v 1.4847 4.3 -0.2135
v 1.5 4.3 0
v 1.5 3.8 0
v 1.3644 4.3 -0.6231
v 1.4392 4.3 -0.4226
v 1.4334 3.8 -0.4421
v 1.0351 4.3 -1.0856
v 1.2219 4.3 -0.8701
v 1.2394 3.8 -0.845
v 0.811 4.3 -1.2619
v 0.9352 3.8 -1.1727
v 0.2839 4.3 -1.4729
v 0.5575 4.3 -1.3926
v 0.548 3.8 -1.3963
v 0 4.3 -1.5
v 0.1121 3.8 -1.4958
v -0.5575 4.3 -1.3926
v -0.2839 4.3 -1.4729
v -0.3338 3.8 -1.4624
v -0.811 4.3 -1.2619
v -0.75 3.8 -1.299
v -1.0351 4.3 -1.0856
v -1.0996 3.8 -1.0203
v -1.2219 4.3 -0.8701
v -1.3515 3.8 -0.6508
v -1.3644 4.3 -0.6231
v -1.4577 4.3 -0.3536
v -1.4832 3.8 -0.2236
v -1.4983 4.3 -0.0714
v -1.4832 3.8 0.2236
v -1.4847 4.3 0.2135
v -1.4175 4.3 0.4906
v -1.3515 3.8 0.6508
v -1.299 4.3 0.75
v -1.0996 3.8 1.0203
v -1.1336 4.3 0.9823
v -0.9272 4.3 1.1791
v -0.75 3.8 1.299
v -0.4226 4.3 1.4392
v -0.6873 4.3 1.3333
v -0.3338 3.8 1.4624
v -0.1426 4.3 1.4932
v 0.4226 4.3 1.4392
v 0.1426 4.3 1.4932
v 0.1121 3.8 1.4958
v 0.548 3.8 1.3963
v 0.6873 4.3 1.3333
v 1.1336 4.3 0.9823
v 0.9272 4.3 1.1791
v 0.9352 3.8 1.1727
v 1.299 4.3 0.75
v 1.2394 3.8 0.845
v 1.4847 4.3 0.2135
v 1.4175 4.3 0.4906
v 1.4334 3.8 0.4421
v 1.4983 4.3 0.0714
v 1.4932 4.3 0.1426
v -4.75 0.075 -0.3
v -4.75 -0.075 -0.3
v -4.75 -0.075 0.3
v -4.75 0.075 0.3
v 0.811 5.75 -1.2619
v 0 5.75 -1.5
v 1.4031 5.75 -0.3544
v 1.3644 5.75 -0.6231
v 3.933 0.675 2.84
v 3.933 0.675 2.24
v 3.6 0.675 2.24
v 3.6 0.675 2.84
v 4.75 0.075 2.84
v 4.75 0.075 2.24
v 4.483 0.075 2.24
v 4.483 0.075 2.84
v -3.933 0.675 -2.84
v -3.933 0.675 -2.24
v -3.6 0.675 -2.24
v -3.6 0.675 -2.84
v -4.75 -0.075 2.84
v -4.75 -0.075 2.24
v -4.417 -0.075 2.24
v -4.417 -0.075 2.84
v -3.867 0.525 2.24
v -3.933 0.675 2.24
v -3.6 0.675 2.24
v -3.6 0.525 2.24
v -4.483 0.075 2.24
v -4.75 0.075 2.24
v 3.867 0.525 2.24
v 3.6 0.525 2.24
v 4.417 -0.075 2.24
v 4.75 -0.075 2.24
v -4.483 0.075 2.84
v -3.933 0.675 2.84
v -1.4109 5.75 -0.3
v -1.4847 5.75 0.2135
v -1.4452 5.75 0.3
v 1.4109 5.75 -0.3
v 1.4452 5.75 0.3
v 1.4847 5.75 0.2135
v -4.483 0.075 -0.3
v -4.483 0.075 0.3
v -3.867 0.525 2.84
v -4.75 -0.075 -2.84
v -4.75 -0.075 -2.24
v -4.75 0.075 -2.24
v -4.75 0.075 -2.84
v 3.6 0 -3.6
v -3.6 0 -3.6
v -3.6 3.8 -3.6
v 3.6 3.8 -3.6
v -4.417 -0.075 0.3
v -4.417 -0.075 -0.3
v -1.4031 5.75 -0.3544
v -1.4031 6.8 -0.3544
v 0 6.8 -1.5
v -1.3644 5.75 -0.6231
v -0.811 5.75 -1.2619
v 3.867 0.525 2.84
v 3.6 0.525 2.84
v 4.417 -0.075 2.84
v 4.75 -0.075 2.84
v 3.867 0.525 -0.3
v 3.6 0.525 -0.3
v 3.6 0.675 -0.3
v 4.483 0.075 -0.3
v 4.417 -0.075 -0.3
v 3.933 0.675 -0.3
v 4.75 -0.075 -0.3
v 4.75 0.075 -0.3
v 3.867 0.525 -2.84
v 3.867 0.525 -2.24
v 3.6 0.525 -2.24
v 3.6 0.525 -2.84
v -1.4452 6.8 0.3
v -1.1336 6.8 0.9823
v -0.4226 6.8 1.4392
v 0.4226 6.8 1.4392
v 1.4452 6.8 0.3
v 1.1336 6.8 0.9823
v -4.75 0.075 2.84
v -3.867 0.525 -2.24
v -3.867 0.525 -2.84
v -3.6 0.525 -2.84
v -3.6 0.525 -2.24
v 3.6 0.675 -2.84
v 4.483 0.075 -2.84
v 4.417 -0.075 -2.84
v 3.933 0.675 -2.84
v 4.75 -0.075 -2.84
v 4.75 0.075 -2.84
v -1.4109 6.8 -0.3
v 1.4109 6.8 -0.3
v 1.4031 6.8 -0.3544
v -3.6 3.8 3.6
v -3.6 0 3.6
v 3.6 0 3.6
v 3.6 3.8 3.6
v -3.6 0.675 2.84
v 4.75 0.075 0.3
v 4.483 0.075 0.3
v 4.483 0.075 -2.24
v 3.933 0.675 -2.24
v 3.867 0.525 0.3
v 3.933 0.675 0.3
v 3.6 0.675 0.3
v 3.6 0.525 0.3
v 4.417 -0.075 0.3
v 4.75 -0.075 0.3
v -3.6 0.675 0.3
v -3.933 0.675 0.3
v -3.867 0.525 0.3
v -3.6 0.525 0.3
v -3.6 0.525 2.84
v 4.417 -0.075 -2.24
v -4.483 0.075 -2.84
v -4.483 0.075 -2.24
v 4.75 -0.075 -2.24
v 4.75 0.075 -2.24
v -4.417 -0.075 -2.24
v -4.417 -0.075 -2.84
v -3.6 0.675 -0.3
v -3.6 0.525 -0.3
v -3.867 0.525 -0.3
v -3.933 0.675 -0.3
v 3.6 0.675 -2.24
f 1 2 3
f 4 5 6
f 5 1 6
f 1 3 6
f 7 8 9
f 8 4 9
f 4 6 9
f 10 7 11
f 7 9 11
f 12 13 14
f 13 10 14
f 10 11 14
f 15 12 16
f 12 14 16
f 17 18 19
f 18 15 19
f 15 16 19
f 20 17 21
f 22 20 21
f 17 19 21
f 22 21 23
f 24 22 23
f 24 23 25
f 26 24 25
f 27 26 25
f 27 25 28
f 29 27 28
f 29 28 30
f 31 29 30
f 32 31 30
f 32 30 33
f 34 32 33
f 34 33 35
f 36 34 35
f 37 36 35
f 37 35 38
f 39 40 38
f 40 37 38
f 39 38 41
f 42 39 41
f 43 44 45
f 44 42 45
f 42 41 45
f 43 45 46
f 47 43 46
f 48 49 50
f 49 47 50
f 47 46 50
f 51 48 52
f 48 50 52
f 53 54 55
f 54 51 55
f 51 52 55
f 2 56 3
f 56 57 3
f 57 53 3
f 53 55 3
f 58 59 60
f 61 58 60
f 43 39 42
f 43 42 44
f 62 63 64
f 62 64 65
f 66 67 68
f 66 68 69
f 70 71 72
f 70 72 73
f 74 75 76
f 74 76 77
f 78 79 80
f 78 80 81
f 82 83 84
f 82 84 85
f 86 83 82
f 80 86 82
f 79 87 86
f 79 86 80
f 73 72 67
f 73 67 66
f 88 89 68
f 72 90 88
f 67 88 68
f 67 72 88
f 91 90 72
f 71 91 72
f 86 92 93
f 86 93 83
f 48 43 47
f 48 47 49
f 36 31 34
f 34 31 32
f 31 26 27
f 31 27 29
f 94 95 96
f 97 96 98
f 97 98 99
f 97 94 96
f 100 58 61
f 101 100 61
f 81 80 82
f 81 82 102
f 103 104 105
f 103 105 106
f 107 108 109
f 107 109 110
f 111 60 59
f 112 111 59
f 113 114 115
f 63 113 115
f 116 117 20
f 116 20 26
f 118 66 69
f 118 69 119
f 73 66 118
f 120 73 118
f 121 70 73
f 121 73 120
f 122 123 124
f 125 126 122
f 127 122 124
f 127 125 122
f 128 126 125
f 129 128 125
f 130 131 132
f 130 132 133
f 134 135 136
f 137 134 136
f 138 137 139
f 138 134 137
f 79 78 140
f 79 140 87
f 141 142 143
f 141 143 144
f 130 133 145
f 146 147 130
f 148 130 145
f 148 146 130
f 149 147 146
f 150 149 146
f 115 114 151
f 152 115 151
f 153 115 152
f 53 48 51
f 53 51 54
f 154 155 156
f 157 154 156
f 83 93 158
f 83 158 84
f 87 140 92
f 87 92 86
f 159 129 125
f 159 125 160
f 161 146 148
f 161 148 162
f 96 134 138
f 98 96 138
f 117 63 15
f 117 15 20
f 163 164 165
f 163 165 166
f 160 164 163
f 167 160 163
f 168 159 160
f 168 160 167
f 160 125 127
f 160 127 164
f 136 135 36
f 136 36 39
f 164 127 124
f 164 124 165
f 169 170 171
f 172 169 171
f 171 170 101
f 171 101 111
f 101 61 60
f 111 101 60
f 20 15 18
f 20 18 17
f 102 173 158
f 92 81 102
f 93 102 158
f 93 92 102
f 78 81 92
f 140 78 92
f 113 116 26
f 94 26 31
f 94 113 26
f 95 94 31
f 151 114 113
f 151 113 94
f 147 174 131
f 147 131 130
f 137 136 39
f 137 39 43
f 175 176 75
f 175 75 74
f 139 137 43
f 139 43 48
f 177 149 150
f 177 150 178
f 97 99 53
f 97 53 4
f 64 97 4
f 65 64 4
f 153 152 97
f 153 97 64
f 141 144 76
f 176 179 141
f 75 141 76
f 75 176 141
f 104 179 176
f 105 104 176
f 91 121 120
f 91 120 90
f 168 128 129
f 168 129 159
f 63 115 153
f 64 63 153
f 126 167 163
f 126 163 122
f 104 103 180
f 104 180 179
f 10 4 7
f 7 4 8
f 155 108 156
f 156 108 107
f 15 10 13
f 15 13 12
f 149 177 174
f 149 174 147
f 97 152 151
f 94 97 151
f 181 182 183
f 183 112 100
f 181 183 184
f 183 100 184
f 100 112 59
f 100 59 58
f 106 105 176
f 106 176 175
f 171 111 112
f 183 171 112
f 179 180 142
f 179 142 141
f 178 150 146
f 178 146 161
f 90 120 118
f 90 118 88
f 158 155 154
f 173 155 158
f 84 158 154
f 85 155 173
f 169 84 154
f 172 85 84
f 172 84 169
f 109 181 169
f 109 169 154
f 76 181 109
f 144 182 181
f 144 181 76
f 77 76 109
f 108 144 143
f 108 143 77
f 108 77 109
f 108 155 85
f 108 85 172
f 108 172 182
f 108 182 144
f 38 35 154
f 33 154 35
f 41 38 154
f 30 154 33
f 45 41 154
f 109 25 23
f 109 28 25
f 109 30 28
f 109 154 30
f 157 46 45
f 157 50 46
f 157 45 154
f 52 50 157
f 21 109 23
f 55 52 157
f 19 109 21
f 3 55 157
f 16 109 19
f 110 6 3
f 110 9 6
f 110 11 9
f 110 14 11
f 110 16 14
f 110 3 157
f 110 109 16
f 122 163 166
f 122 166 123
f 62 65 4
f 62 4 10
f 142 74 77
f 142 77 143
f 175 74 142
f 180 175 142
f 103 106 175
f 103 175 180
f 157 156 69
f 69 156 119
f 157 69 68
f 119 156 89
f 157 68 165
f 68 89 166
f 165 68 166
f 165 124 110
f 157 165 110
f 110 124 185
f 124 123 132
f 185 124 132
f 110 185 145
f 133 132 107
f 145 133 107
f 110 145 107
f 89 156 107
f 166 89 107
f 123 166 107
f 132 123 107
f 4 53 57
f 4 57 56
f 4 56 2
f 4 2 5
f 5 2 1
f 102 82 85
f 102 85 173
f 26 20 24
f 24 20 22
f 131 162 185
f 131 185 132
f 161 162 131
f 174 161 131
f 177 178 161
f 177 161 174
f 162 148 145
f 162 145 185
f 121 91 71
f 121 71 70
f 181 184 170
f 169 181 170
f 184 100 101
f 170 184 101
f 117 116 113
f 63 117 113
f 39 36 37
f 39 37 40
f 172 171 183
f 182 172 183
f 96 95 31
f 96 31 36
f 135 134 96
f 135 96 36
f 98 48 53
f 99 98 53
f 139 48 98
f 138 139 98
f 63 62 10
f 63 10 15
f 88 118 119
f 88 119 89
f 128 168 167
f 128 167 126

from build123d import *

# Parameters (mm, degrees)
SKETCH1_W               = 7.2
SKETCH1_H               = 7.2
BOSS_EXTRUDE1_DEPTH     = 3.8
SKETCH2_R               = 1.5
BOSS_EXTRUDE2_DEPTH     = 3
SKETCH3_R               = 1.65
CUT_EXTRUDE1_DEPTH      = 2.5
CUT_EXTRUDE2_DEPTH      = 1.05
SKETCH6_W               = 0.6
SKETCH6_H               = 0.15
LPATTERN1_COUNT         = 2
LPATTERN1_PITCH         = 2.54
LPATTERN1_COL_COUNT     = 2
LPATTERN1_COL_PITCH     = 2.54
MIRROR1_COPY_1_SKETCH_W = 0.6
MIRROR1_COPY_1_SKETCH_H = 0.15
MIRROR1_COPY_2_SKETCH_W = 0.6
MIRROR1_COPY_2_SKETCH_H = 0.15


with BuildPart() as part:
    # Sketch1 → Boss-Extrude1 (new body)
    with BuildSketch(Plane(origin=(0, 0, 0), x_dir=(1, 0, 0), z_dir=(0, 1, 0))):
        Rectangle(SKETCH1_W, SKETCH1_H)
    extrude(amount=BOSS_EXTRUDE1_DEPTH)

    # Sketch2 → Boss-Extrude2 (add)
    with BuildSketch(Plane(origin=(0, 3.8, 0), x_dir=(1, 0, 0), z_dir=(0, 1, 0))):
        Circle(SKETCH2_R)
    extrude(amount=BOSS_EXTRUDE2_DEPTH)

    # Sketch3 → Cut-Extrude1 (cut)
    with BuildSketch(Plane(origin=(0, 6.8, 0), x_dir=(1, 0, 0), z_dir=(0, 1, 0))):
        Circle(SKETCH3_R)
        Polygon((0, 1.5), (-0.810961226, 1.261880299), (-1.364447993, 0.62312252), (-1.484732163, -0.213472257), (-1.133624362, -0.982291101), (-0.422598835, -1.43923946), (0.422598835, -1.43923946), (1.133624362, -0.982291101), (1.484732163, -0.213472257), (1.364447993, 0.62312252), (0.810961226, 1.261880299), align=None, mode=Mode.SUBTRACT)
    extrude(amount=-CUT_EXTRUDE1_DEPTH, mode=Mode.SUBTRACT)

    # Sketch4 → Cut-Extrude2 (cut)
    with BuildSketch(Plane(origin=(0, 6.8, 0), x_dir=(1, 0, 0), z_dir=(0, 1, 0))):
        Polygon((1.410905998, 0.3), (-1.410905998, 0.3), (-1.484732163, -0.213472257), (-1.445216267, -0.3), (1.445216267, -0.3), (1.484732163, -0.213472257), align=None)
        Polygon((-1.364447993, 0.62312252), (-1.403086684, 0.35438452), (0, 1.5), (-0.810961226, 1.261880299), align=None)
        Polygon((0.810961226, 1.261880299), (0, 1.5), (1.403086684, 0.35438452), (1.364447993, 0.62312252), align=None)
    extrude(amount=-CUT_EXTRUDE2_DEPTH, mode=Mode.SUBTRACT)

    # Sweep1: sweep along a path in Sketch5
    with BuildLine(Plane.XY) as sweep1_path:
        Line((3.6, 0.6), (3.9, 0.6))
        Line((3.9, 0.6), (4.45, 0))
        Line((4.45, 0), (4.75, 0))
    # Sketch6 → Sweep1 (sweep)
    with BuildSketch(Plane(origin=(3.6, 0, 0), x_dir=(0, 0, -1), z_dir=(1, 0, 0))):
        with Locations((0, 0.6)):
            Rectangle(SKETCH6_W, SKETCH6_H)
    sweep1 = sweep(path=sweep1_path.line, transition=Transition.RIGHT)

    # LPattern1: Sweep1 ×2
    with Locations(*[(0, 0, -i * LPATTERN1_PITCH) for i in range(1, LPATTERN1_COUNT)]):
        add(sweep1)

    # LPattern1 col: Sweep1 ×2
    with Locations(*[(0, 0, i * LPATTERN1_COL_PITCH) for i in range(1, LPATTERN1_COL_COUNT)]):
        add(sweep1)

    # Mirror1: Sweep1 across plane
    add(sweep1.mirror(Plane(origin=(0, 0, 0), x_dir=(0, 0, 1), z_dir=(1, 0, 0))))

    # Mirror1 copy 1: sweep along a path in Mirror1 copy 1 path
    with BuildLine(Plane(origin=(0, 0, -2.54), x_dir=(-1, 0, 0), z_dir=(0, 0, 1))) as mirror1_copy_1_path:
        Line((3.6, -0.6), (3.9, -0.6))
        Line((3.9, -0.6), (4.45, 0))
        Line((4.45, 0), (4.75, 0))
    # Mirror1 copy 1 sketch → Mirror1 copy 1 (sweep)
    with BuildSketch(Plane(origin=(-3.6, 0, -2.54), x_dir=(0, 0, -1), z_dir=(-1, 0, 0))):
        with Locations((0, -0.6)):
            Rectangle(MIRROR1_COPY_1_SKETCH_W, MIRROR1_COPY_1_SKETCH_H)
    sweep(path=mirror1_copy_1_path.line, transition=Transition.RIGHT)

    # Mirror1 copy 2: sweep along a path in Mirror1 copy 2 path
    with BuildLine(Plane(origin=(0, 0, 2.54), x_dir=(-1, 0, 0), z_dir=(0, 0, 1))) as mirror1_copy_2_path:
        Line((3.6, -0.6), (3.9, -0.6))
        Line((3.9, -0.6), (4.45, 0))
        Line((4.45, 0), (4.75, 0))
    # Mirror1 copy 2 sketch → Mirror1 copy 2 (sweep)
    with BuildSketch(Plane(origin=(-3.6, 0, 2.54), x_dir=(0, 0, -1), z_dir=(-1, 0, 0))):
        with Locations((0, -0.6)):
            Rectangle(MIRROR1_COPY_2_SKETCH_W, MIRROR1_COPY_2_SKETCH_H)
    sweep(path=mirror1_copy_2_path.line, transition=Transition.RIGHT)


solid = part.part
